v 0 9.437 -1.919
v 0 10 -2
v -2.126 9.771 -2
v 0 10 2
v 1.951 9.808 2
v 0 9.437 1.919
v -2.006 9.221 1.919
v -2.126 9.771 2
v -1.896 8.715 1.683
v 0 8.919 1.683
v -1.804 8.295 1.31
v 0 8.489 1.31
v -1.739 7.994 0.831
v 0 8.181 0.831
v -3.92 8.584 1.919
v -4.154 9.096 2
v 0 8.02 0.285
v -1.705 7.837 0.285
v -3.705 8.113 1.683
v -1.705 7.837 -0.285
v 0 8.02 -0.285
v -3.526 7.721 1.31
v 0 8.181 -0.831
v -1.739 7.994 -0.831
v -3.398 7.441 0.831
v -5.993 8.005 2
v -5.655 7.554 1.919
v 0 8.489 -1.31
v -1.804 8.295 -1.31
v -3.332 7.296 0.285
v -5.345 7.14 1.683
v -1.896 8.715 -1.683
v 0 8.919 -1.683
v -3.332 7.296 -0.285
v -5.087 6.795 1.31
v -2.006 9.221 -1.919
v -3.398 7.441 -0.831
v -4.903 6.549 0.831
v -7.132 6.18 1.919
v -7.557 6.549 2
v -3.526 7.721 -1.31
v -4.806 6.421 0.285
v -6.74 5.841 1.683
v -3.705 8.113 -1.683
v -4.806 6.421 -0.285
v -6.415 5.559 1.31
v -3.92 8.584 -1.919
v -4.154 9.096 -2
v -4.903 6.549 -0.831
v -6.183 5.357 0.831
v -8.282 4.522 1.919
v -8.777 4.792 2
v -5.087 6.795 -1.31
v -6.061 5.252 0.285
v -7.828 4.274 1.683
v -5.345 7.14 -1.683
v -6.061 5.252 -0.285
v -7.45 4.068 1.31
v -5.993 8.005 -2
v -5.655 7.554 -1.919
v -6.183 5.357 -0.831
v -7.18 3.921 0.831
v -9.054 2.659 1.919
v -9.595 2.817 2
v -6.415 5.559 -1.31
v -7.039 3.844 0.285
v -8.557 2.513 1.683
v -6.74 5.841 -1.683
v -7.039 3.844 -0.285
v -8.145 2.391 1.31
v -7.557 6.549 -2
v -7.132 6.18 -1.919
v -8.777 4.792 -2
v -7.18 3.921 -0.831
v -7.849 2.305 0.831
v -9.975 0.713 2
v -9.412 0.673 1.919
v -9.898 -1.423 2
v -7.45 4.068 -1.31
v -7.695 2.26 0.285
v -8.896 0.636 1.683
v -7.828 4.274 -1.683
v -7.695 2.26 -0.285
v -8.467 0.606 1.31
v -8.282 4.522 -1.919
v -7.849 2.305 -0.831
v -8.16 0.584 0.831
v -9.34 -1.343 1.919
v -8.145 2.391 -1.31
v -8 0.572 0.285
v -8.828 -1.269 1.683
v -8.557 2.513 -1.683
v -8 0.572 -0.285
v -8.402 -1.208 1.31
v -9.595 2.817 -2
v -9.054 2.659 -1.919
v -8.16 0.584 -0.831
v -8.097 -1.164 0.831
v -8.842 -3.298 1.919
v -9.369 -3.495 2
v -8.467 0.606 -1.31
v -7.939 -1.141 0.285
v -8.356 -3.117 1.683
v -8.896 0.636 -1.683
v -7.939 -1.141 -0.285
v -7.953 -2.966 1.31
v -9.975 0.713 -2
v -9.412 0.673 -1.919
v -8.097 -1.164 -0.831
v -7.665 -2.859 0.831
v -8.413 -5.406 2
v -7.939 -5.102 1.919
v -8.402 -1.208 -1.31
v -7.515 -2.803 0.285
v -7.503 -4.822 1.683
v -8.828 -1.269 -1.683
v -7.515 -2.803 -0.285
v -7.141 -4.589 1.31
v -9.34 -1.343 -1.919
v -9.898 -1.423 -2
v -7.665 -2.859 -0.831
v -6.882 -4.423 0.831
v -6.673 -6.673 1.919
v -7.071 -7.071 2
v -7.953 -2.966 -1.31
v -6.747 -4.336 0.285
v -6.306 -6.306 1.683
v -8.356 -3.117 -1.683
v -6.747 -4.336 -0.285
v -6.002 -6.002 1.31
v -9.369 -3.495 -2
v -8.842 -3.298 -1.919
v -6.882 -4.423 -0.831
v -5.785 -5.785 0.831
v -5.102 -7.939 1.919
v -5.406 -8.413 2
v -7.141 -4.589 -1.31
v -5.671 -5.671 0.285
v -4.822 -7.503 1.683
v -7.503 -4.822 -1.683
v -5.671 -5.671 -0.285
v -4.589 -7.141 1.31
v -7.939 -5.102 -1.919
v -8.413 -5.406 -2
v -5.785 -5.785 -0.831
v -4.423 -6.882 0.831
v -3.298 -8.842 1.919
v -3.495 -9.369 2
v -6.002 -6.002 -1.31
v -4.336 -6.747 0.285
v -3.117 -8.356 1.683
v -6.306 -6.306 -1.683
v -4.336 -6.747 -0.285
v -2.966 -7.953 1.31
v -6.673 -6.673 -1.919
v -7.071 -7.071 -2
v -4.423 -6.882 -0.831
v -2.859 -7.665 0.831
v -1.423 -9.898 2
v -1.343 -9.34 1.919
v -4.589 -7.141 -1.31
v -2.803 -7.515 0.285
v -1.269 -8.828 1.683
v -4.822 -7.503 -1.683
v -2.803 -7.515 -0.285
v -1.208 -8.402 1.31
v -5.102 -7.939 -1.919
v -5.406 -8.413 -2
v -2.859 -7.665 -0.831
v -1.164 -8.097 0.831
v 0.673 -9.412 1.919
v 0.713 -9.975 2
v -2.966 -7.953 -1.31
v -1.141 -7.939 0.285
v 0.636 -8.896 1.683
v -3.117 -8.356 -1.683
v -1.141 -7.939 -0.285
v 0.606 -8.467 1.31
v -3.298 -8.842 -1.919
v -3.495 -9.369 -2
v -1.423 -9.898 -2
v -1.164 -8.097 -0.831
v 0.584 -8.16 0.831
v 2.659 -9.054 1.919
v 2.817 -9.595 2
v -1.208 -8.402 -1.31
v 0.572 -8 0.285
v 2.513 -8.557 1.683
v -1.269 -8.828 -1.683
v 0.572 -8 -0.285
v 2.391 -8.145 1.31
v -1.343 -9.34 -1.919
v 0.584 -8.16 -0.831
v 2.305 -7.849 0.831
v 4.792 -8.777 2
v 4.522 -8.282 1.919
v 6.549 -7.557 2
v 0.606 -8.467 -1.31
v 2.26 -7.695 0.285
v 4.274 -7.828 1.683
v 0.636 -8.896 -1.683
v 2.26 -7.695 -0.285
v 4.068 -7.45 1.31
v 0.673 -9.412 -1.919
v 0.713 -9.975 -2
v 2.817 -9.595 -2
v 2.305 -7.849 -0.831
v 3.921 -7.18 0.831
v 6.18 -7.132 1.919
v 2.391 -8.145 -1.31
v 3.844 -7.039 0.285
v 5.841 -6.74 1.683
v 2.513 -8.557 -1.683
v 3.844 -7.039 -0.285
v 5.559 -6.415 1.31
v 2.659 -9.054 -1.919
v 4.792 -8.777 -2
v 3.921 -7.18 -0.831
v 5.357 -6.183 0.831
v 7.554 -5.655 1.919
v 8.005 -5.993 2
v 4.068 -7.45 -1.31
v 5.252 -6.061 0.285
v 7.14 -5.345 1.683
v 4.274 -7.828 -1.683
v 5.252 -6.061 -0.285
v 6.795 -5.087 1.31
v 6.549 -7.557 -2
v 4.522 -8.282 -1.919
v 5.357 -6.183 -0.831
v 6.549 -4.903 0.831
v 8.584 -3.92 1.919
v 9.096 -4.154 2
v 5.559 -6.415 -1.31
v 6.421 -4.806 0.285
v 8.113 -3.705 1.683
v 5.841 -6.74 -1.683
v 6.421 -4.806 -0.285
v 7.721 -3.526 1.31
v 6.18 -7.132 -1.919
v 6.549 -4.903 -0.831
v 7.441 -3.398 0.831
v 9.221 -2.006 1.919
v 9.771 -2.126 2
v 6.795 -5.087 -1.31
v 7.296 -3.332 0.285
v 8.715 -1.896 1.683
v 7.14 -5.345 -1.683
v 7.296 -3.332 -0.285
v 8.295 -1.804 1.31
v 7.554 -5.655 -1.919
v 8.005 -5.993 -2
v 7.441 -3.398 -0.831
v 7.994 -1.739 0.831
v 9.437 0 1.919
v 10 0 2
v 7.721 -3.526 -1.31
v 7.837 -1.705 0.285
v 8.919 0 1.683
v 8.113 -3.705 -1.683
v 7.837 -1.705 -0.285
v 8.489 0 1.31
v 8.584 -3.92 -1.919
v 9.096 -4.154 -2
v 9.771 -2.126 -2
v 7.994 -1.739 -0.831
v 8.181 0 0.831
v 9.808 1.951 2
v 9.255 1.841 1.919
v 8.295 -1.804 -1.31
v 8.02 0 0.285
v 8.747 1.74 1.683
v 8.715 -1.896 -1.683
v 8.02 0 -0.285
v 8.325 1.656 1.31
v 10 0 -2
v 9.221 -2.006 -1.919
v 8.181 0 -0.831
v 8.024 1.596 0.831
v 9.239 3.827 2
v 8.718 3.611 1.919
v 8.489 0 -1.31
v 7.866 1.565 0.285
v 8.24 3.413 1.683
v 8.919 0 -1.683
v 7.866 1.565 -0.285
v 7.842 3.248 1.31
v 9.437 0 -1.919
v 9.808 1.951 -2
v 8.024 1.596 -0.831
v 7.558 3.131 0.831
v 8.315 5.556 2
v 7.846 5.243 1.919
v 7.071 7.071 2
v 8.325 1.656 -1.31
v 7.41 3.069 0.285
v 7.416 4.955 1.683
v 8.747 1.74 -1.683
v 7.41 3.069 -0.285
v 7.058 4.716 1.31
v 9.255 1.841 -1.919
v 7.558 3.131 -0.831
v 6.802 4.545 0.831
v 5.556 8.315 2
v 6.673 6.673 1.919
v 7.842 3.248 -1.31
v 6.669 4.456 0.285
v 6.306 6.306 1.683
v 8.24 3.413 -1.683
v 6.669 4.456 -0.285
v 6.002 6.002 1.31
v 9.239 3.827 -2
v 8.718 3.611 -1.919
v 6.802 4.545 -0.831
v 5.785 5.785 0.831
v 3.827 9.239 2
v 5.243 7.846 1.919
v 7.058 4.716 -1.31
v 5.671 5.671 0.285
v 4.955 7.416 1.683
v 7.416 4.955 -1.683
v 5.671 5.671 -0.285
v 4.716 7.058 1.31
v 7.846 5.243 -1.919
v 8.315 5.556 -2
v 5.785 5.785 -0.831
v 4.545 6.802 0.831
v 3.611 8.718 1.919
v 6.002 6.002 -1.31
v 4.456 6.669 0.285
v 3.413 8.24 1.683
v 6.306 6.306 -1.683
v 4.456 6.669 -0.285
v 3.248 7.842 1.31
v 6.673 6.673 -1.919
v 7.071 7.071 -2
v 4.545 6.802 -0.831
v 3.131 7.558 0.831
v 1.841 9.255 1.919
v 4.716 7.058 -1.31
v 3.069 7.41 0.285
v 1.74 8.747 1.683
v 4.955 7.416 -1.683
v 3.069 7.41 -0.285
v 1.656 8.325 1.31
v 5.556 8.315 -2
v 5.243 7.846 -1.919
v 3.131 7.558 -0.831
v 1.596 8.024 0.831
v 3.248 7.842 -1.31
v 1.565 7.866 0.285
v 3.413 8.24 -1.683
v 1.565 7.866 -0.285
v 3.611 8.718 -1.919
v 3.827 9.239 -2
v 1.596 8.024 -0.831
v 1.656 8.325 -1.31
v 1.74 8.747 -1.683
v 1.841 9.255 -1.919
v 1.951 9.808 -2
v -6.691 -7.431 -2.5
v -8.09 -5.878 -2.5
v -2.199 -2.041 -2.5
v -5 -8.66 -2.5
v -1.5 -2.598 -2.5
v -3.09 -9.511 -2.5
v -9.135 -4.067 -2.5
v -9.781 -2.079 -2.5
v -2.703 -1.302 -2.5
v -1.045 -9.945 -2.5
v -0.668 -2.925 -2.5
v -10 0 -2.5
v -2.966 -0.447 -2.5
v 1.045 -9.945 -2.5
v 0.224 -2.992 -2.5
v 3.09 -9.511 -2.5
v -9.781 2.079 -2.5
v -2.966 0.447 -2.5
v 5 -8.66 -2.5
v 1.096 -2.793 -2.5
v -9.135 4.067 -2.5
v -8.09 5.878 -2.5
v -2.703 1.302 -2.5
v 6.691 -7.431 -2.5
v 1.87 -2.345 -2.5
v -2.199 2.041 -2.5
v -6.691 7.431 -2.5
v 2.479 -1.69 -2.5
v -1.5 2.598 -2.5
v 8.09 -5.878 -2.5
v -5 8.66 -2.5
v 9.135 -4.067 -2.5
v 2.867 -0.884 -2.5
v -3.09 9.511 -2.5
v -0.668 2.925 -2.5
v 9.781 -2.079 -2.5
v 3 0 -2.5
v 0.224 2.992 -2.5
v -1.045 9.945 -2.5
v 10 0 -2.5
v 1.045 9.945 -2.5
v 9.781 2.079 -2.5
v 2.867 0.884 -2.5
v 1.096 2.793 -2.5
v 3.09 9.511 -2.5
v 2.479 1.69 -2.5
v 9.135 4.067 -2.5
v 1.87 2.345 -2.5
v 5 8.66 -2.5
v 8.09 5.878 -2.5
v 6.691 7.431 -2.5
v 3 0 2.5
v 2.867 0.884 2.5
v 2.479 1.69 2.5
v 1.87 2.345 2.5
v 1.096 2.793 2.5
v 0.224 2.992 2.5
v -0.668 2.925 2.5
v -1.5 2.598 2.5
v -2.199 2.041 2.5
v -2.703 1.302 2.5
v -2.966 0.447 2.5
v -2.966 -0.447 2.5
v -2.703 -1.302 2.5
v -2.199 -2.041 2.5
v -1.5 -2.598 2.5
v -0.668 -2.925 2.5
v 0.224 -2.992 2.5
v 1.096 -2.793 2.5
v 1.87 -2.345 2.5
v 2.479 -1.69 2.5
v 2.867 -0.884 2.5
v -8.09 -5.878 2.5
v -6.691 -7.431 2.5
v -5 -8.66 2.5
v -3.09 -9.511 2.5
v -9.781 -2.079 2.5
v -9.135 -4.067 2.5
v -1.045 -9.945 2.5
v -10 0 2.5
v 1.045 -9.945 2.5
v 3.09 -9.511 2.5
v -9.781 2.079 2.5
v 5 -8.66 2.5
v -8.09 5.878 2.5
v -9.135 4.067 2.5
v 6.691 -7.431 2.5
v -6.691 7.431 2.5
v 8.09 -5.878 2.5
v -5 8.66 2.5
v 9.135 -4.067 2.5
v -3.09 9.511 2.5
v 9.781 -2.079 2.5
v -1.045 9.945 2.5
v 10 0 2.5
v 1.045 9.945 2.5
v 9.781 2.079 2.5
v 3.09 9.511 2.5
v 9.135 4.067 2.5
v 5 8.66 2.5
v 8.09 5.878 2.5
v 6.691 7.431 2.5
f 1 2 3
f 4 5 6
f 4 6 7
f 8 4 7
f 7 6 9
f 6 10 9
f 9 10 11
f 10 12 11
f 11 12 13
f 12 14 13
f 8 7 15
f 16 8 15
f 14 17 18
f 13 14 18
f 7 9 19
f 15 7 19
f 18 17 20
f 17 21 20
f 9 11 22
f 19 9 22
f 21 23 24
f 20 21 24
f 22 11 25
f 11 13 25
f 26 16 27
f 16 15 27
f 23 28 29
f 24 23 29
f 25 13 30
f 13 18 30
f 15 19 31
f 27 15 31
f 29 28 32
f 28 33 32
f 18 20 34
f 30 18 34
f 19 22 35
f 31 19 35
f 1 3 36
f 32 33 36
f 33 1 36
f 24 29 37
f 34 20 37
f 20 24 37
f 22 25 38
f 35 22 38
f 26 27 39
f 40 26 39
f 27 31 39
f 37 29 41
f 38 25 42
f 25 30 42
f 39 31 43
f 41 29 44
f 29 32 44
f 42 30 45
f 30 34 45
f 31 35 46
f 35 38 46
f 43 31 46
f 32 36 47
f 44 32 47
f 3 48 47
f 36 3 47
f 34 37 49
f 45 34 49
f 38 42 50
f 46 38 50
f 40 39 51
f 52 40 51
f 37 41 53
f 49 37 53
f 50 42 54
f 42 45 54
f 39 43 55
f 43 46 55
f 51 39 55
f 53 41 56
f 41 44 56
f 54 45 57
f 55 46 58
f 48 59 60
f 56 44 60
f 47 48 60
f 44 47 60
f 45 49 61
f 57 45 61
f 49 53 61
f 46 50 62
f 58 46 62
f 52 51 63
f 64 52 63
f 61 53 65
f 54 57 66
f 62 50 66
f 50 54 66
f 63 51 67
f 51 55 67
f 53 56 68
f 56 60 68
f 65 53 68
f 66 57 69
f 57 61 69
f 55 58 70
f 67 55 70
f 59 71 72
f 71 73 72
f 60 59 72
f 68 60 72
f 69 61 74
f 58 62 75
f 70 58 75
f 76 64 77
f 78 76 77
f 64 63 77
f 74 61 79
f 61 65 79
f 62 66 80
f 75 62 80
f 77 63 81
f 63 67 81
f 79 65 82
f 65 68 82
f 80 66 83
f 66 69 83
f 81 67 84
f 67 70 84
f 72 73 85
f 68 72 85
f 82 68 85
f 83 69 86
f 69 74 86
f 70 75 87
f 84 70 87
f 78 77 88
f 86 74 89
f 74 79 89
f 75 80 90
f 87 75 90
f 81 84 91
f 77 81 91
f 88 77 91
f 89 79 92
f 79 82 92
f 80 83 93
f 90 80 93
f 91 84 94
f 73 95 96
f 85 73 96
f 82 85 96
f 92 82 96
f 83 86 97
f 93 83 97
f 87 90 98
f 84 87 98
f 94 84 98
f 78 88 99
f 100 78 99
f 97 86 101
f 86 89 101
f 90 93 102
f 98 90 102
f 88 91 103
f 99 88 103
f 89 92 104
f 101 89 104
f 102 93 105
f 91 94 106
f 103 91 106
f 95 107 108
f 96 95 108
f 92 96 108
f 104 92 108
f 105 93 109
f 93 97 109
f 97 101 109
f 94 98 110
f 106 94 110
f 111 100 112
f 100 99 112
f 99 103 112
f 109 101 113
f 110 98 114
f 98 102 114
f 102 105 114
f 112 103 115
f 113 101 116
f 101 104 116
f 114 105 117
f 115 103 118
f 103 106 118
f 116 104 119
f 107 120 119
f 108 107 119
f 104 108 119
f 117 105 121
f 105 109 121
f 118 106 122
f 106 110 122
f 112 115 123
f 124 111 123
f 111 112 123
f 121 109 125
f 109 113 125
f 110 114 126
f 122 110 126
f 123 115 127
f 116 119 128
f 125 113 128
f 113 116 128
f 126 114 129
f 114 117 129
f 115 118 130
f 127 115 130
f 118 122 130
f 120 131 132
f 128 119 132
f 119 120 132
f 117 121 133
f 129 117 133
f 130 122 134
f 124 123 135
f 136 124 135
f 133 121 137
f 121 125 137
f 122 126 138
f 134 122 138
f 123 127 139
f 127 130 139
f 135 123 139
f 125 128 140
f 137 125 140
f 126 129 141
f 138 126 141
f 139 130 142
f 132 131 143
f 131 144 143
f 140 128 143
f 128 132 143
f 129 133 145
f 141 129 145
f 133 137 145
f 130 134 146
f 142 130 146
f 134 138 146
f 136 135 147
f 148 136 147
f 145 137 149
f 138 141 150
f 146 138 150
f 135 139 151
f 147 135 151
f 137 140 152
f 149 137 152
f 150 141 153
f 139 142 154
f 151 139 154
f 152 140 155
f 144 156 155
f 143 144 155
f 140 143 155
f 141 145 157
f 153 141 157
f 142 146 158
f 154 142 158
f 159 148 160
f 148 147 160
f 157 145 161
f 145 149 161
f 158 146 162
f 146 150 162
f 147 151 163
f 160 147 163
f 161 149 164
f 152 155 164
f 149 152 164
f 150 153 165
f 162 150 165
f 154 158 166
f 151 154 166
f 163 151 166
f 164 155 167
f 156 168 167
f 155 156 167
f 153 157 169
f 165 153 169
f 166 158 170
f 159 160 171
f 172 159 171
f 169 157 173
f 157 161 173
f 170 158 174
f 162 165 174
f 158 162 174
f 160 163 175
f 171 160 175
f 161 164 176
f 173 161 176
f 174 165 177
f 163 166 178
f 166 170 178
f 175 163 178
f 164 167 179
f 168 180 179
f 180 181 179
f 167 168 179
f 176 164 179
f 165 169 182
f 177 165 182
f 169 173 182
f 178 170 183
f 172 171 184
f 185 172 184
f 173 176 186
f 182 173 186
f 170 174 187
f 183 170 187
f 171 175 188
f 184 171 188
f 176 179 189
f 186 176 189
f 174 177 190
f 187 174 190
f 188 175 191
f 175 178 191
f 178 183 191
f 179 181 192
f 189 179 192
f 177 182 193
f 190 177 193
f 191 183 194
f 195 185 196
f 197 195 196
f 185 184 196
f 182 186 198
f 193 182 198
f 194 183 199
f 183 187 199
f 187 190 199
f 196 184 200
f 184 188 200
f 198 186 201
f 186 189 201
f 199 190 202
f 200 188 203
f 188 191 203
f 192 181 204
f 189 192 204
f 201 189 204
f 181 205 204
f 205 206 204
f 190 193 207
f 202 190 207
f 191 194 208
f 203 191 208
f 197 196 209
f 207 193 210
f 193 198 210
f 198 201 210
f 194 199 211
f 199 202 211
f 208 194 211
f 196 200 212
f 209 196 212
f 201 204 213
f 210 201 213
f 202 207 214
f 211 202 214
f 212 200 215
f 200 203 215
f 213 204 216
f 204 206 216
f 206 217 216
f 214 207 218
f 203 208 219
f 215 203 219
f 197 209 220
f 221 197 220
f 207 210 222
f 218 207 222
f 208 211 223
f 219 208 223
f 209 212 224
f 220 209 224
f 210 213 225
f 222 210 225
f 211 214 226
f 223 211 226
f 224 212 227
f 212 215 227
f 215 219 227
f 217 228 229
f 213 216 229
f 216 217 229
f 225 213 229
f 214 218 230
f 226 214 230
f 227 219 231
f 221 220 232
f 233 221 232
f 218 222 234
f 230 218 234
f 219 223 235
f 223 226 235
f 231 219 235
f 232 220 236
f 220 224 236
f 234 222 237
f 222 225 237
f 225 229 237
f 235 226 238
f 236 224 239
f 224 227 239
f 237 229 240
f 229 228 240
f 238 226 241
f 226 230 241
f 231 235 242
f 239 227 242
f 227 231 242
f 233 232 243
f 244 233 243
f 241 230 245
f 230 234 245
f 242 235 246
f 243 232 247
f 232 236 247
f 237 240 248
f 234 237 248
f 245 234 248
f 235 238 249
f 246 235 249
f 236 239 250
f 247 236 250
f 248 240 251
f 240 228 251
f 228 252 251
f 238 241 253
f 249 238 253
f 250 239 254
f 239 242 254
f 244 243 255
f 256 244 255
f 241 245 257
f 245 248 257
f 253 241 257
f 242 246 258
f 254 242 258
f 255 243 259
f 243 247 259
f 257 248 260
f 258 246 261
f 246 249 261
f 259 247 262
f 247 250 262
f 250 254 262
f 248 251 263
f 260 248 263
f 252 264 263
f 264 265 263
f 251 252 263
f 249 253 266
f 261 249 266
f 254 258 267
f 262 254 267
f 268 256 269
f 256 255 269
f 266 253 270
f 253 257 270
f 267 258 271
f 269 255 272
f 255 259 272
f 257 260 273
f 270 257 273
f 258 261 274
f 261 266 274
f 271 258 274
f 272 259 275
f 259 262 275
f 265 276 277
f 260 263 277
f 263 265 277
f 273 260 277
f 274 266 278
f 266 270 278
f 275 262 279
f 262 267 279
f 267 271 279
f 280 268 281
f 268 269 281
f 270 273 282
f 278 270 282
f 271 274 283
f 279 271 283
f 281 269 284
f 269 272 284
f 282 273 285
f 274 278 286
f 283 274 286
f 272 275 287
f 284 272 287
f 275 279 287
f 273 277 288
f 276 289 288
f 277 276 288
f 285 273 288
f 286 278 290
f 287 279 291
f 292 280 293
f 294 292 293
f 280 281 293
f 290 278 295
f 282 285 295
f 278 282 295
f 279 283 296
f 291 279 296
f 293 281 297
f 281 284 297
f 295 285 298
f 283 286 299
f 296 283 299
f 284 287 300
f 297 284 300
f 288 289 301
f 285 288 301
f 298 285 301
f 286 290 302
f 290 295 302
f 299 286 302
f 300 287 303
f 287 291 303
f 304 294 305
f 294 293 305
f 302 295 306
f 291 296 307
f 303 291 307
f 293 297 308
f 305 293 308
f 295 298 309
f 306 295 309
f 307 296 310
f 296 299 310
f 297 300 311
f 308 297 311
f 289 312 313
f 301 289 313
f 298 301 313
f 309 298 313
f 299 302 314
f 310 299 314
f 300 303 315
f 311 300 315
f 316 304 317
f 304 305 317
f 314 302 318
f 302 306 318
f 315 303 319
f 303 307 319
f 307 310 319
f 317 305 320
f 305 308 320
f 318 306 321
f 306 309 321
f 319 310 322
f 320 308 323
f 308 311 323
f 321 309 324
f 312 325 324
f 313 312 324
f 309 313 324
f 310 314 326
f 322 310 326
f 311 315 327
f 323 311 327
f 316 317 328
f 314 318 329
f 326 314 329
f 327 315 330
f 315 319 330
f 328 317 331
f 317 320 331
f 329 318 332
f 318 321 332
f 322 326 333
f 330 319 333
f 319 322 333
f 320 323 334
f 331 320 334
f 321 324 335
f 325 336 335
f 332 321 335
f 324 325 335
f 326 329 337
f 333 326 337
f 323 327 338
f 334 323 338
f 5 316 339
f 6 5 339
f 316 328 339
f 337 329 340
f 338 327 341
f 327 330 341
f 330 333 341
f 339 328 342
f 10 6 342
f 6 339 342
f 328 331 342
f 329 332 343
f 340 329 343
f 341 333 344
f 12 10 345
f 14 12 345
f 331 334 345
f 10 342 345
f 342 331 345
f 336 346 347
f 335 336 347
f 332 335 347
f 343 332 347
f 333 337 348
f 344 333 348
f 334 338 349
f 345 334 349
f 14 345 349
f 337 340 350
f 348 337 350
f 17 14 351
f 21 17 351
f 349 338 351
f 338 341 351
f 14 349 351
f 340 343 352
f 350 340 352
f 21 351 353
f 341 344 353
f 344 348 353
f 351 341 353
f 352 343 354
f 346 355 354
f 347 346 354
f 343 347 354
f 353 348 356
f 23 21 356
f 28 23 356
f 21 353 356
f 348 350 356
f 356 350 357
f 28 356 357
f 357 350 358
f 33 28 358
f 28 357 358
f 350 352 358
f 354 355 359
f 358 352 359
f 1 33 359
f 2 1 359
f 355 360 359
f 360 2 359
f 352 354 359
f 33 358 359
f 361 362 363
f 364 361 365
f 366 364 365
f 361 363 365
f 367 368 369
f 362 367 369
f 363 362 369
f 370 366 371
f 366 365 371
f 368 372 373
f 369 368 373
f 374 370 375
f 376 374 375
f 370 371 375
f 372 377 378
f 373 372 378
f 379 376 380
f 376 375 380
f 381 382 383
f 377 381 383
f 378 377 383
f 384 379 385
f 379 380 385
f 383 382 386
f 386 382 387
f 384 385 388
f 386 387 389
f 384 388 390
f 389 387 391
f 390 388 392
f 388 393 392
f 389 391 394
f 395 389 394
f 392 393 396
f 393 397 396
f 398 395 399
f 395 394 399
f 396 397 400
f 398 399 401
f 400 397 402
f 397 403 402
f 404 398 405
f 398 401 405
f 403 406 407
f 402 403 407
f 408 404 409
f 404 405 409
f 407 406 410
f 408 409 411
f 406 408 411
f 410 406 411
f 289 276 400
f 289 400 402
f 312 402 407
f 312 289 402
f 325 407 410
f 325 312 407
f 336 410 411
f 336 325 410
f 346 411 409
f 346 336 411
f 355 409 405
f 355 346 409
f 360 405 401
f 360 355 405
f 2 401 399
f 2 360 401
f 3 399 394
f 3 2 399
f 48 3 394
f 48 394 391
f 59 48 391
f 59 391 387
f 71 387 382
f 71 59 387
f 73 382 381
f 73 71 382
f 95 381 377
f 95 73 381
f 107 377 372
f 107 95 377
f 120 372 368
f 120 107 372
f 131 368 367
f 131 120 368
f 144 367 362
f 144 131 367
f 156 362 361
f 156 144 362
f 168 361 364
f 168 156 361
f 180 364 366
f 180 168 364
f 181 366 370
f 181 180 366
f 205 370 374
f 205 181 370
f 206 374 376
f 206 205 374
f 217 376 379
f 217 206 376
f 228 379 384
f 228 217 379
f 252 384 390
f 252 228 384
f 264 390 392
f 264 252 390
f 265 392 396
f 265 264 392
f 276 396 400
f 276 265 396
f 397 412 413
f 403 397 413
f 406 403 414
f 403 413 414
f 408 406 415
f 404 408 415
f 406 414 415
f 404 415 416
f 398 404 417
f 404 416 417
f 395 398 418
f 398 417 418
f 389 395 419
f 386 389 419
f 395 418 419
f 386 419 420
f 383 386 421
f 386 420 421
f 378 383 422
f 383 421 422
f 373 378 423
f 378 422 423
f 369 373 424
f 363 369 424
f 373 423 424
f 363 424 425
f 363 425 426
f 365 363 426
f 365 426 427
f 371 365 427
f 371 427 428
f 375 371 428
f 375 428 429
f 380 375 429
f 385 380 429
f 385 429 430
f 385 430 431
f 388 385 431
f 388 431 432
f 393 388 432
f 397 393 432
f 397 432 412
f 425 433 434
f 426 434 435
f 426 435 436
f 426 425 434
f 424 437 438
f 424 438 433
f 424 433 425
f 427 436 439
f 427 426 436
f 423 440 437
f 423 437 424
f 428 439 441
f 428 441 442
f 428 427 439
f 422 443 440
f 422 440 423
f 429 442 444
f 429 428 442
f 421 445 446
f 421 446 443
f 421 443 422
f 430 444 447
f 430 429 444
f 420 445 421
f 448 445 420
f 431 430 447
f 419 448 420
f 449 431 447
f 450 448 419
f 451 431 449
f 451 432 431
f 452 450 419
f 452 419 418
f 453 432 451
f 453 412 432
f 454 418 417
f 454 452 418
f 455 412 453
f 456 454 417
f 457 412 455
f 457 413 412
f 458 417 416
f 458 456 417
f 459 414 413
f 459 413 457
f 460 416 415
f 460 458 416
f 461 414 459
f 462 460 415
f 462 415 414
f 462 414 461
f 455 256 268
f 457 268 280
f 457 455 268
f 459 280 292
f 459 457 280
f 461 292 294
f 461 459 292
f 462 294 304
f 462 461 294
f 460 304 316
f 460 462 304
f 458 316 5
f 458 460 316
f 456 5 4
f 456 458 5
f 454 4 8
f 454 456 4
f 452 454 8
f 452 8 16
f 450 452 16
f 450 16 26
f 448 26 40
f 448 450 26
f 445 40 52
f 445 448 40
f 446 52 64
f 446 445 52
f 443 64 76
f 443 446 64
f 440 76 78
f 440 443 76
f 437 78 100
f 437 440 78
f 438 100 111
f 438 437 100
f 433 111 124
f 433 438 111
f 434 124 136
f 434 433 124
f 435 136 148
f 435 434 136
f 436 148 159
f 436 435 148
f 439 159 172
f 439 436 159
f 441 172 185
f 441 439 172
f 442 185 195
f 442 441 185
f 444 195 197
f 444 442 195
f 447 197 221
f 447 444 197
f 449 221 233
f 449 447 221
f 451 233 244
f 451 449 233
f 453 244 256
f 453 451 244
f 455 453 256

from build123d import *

# Parameters (mm, degrees)
F0_R     = 10
F1_DEPTH = 2.5
F2_R     = 2
F4_R     = 3
F5_DEPTH = 25


with BuildPart() as f1:
    # F0 (on Top) → F1 (new body, symmetric)
    with BuildSketch(Plane.XY):
        Circle(F0_R)
    extrude(amount=F1_DEPTH, both=True)

    # F2 (on Right) → F3 (revolve, cut)
    with BuildSketch(Plane.YZ):
        with Locations((10, 0)):
            Circle(F2_R)
    revolve(axis=Axis((0, 0, 4.383557), (0, 0, 1)), mode=Mode.SUBTRACT)

    # F4 (on face) → F5 (cut)
    with BuildSketch(Plane.XY.offset(2.5)):
        Circle(F4_R)
    extrude(amount=-F5_DEPTH, mode=Mode.SUBTRACT)


solid = f1.part
